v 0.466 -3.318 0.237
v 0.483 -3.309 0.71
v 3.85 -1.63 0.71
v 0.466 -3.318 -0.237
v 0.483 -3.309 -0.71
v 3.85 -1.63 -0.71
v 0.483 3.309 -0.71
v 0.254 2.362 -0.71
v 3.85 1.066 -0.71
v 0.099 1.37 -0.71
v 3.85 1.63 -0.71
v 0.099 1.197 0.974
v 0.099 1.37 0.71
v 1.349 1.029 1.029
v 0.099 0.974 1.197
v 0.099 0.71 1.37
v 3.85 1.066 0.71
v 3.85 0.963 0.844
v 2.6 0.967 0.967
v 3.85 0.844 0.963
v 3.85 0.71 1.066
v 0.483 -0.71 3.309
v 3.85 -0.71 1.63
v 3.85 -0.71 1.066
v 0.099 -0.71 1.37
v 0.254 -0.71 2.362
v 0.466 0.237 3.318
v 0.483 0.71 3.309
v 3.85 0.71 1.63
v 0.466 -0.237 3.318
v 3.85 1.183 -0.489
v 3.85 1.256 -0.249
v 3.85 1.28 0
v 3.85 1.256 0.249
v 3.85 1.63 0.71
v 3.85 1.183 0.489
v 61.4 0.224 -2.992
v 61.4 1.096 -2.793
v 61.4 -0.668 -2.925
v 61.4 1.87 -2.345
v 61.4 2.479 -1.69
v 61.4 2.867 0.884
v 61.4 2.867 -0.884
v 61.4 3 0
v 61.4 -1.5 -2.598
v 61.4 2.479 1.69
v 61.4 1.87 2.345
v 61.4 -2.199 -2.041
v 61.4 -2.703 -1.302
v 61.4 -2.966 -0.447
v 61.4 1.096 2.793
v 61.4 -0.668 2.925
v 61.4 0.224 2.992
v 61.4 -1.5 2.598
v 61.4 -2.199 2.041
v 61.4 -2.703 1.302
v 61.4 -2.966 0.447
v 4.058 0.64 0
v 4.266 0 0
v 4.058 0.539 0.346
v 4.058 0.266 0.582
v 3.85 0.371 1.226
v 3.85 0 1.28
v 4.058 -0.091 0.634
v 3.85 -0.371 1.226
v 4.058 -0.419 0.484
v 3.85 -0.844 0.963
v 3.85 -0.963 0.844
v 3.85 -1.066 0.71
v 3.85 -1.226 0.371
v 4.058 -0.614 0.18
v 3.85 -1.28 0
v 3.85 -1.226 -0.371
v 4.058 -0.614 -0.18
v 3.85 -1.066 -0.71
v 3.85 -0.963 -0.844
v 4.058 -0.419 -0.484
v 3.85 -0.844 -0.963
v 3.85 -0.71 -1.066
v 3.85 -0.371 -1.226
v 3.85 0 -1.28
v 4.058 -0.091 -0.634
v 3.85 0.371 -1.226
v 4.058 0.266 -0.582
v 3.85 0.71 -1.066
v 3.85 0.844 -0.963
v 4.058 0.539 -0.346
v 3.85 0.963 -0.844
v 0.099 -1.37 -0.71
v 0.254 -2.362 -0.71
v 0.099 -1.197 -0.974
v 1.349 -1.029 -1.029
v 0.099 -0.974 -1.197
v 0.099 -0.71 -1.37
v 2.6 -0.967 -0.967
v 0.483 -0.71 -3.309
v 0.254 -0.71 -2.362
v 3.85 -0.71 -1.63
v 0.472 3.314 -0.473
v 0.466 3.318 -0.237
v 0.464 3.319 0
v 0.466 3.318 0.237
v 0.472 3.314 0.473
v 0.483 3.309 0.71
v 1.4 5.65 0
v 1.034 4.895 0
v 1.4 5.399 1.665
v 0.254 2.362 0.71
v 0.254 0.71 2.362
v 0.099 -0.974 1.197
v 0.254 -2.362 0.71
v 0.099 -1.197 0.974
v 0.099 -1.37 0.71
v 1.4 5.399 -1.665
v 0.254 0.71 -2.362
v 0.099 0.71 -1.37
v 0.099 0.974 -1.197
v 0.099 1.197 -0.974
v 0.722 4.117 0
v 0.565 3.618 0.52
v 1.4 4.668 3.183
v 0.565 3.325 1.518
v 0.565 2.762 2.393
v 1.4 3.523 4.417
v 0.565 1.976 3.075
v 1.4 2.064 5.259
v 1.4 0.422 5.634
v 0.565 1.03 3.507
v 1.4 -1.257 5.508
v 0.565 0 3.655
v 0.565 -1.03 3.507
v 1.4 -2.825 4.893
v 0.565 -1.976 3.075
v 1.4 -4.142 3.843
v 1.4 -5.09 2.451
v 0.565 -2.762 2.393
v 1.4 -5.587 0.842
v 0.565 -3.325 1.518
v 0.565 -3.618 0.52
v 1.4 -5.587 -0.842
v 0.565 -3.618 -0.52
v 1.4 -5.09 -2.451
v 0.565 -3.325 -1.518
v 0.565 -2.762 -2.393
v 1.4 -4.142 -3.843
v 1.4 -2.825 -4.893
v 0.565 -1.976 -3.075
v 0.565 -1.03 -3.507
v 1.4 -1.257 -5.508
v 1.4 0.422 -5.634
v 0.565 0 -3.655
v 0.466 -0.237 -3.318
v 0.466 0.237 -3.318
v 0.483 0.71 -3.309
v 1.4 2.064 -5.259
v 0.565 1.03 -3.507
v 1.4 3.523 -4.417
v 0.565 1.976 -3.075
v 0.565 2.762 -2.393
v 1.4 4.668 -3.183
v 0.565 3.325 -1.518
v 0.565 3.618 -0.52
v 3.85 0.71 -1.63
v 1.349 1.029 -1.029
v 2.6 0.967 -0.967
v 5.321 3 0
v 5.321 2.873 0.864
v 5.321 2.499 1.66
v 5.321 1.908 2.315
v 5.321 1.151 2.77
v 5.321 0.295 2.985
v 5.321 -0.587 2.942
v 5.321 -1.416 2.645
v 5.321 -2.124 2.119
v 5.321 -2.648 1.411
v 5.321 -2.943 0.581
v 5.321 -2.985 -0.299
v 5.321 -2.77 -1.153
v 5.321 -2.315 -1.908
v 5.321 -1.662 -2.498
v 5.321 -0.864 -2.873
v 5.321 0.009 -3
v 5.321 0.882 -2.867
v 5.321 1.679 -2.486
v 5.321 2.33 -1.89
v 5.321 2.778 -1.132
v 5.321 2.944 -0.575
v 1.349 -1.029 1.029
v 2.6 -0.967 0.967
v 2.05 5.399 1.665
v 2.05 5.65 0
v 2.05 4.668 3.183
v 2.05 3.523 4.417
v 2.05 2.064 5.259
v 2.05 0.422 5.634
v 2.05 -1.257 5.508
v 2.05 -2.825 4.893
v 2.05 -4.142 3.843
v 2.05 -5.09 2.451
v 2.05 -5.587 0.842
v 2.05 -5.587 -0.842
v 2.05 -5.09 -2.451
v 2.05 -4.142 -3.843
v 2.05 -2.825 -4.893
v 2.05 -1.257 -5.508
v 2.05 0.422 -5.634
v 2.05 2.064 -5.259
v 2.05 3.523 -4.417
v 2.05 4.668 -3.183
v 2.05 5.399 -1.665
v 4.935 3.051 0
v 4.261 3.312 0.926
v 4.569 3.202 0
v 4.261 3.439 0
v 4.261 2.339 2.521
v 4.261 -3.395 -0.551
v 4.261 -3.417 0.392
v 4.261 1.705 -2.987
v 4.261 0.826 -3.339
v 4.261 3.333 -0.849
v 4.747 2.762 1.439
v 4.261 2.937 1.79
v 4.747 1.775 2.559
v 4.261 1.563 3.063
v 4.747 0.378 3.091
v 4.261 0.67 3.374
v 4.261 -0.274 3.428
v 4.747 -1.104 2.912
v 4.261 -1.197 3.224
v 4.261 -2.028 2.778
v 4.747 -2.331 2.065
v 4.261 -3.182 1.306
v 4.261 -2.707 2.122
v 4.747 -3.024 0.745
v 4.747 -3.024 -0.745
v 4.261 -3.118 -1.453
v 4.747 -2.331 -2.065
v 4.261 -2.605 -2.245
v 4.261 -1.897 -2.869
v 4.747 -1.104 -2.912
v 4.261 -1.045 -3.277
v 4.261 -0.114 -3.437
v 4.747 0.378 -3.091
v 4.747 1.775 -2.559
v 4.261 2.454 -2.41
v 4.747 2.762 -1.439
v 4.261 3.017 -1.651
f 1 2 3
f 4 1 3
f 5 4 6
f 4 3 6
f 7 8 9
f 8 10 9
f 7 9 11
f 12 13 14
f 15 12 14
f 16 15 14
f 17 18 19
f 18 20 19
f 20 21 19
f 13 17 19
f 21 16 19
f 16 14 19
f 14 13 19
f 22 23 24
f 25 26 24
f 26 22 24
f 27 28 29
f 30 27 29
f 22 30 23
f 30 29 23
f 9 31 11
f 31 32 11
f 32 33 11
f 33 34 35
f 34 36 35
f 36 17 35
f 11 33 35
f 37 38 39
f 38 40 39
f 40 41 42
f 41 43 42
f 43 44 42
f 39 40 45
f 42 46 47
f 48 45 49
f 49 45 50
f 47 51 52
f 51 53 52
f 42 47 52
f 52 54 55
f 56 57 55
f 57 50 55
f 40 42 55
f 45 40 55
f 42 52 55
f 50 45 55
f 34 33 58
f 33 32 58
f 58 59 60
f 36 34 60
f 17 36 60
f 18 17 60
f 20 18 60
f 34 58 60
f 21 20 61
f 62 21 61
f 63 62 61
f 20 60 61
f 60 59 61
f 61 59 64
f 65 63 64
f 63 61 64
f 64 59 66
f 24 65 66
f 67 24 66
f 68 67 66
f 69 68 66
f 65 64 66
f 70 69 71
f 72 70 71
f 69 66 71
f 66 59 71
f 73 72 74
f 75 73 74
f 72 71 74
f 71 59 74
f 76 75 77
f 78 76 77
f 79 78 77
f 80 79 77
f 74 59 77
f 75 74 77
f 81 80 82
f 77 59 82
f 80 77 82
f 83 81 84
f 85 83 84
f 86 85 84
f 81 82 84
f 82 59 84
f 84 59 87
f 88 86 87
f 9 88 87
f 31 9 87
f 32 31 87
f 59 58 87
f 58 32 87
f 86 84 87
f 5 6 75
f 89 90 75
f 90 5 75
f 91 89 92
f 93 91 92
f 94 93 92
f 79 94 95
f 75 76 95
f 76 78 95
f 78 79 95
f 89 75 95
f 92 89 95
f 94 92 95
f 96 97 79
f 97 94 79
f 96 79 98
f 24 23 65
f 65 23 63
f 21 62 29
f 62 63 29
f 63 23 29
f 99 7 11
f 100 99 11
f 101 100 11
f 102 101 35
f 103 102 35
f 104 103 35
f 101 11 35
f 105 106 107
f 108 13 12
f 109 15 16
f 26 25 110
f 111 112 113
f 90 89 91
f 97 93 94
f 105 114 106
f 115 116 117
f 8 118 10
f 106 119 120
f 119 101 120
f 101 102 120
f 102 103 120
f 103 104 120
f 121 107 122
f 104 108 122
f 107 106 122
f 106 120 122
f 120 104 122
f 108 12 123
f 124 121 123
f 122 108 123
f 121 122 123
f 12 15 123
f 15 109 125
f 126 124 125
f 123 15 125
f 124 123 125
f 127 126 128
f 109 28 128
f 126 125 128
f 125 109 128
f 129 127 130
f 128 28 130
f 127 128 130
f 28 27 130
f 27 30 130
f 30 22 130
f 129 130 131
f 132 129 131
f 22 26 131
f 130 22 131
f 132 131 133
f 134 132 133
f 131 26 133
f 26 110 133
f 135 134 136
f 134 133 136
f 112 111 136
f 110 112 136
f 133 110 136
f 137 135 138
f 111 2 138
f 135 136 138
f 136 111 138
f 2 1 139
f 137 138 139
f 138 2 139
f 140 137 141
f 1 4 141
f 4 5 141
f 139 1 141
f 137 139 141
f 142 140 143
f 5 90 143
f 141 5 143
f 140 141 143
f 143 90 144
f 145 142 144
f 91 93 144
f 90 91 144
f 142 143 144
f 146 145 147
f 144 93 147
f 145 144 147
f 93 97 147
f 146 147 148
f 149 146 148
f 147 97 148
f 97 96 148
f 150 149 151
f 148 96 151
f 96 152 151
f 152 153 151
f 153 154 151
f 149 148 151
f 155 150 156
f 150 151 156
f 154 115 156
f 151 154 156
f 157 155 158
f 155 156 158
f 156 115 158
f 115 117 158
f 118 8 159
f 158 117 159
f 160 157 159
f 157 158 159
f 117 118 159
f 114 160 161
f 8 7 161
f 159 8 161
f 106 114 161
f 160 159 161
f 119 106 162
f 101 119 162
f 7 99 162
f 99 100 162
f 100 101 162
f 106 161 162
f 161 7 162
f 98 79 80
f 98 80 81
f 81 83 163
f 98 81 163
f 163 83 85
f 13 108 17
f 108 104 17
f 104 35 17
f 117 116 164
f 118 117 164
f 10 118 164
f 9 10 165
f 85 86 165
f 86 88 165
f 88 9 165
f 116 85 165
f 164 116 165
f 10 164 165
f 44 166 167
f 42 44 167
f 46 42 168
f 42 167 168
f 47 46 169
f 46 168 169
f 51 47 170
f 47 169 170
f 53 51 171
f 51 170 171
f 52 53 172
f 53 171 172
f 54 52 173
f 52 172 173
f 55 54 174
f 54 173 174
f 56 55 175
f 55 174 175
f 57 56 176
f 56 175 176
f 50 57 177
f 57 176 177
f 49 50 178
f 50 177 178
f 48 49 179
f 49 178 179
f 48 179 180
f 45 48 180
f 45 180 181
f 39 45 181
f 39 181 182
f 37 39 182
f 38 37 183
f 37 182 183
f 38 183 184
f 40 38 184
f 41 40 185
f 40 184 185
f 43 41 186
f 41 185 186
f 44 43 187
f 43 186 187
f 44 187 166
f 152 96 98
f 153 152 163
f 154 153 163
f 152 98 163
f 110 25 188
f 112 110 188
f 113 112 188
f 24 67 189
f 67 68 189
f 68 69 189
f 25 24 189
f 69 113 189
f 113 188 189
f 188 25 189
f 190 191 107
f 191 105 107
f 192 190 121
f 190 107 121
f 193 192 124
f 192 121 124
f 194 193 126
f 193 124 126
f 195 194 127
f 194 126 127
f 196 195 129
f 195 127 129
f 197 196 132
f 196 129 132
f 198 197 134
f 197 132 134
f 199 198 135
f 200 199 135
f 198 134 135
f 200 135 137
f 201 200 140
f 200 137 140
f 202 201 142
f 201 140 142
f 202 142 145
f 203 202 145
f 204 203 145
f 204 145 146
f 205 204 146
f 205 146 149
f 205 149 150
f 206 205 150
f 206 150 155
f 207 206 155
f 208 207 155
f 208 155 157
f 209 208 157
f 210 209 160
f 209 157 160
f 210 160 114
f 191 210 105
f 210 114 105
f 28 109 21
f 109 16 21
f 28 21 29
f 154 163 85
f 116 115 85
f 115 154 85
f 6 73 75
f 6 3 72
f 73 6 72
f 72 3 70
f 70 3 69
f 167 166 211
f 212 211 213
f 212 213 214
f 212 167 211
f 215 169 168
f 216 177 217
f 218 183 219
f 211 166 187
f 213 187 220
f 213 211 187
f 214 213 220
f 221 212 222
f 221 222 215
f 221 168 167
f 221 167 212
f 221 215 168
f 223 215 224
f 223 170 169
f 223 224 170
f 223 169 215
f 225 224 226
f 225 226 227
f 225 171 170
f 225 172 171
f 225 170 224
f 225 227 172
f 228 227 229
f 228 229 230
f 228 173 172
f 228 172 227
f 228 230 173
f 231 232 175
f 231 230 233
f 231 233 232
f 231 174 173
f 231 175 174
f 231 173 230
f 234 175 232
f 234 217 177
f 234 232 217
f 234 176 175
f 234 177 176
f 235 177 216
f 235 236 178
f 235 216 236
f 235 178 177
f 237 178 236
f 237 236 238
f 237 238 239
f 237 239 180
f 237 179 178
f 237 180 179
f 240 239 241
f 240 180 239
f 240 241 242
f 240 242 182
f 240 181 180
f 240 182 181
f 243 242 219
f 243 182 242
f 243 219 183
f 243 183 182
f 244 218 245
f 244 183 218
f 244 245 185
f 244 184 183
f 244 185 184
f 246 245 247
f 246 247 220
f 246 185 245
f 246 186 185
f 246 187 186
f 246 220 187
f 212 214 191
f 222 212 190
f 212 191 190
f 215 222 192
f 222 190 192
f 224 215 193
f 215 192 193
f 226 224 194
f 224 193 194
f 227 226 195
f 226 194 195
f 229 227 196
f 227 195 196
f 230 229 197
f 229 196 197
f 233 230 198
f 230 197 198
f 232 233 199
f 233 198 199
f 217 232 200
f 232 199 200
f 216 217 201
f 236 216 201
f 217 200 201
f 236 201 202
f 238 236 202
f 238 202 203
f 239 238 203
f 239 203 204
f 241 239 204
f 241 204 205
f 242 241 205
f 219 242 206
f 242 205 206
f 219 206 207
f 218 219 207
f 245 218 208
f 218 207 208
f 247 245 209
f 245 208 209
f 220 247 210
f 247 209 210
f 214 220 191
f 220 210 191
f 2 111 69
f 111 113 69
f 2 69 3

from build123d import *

# Parameters (mm, degrees)
FILLET1_R    = 1.5
SKETCH3_W    = 1.42
SKETCH3_H    = 7.1
SKETCH4_W    = 1.42
SKETCH4_H    = 3.26092226
RECPAT_COUNT = 2
RECPAT_ANGLE = 90


with BuildPart() as part:
    # BodySke → Base-Revolve (revolve)
    with BuildSketch(Plane.XY):
        with BuildLine():
            Line((0, 0), (61.4, 0))
            Line((61.4, 0), (61.4, 3))
            Line((61.4, 3), (4.7, 3))
            Line((4.7, 3), (2.05, 5.65))
            Line((2.05, 5.65), (1.4, 5.65))
            ThreePointArc((1.4, 5.65), (0.355213526, 2.910433816), (0, 0))
        make_face()
    revolve(axis=Axis((-15.875, 0, 0), (1, 0, 0)))

    # Fillet1
    fillet1_edges = [part.edges().sort_by_distance(p)[0] for p in [
        (4.7, -3, 0),
    ]]
    fillet(fillet1_edges, radius=FILLET1_R)

    # Sketch3 → Recess section 0
    with BuildSketch(Plane(origin=(0, 0, 0), x_dir=(0, 0, -1), z_dir=(1, 0, 0))):
        Rectangle(SKETCH3_W, SKETCH3_H)
    # Sketch4 → Recess section 1
    with BuildSketch(Plane(origin=(3.85, 0, 0), x_dir=(0, 0, -1), z_dir=(1, 0, 0))):
        Rectangle(SKETCH4_W, SKETCH4_H)
    recess = loft(mode=Mode.SUBTRACT)

    # RecPat: Recess ×2 about axis
    recpat_axis = Axis((0, 0, 0), (1, 0, 0))
    for i in range(1, RECPAT_COUNT):
        add(recess.rotate(recpat_axis, i * RECPAT_ANGLE / (RECPAT_COUNT - 1)), mode=Mode.SUBTRACT)

    # RecCorSke → RecessCore (revolve, cut)
    with BuildSketch(Plane.XY):
        Polygon((0, 0), (0, 1.549718226), (3.85, 1.2805), (4.266059671, 0), align=None)
    revolve(axis=Axis((-3.175, 0, 0), (1, 0, 0)), mode=Mode.SUBTRACT)


solid = part.part
